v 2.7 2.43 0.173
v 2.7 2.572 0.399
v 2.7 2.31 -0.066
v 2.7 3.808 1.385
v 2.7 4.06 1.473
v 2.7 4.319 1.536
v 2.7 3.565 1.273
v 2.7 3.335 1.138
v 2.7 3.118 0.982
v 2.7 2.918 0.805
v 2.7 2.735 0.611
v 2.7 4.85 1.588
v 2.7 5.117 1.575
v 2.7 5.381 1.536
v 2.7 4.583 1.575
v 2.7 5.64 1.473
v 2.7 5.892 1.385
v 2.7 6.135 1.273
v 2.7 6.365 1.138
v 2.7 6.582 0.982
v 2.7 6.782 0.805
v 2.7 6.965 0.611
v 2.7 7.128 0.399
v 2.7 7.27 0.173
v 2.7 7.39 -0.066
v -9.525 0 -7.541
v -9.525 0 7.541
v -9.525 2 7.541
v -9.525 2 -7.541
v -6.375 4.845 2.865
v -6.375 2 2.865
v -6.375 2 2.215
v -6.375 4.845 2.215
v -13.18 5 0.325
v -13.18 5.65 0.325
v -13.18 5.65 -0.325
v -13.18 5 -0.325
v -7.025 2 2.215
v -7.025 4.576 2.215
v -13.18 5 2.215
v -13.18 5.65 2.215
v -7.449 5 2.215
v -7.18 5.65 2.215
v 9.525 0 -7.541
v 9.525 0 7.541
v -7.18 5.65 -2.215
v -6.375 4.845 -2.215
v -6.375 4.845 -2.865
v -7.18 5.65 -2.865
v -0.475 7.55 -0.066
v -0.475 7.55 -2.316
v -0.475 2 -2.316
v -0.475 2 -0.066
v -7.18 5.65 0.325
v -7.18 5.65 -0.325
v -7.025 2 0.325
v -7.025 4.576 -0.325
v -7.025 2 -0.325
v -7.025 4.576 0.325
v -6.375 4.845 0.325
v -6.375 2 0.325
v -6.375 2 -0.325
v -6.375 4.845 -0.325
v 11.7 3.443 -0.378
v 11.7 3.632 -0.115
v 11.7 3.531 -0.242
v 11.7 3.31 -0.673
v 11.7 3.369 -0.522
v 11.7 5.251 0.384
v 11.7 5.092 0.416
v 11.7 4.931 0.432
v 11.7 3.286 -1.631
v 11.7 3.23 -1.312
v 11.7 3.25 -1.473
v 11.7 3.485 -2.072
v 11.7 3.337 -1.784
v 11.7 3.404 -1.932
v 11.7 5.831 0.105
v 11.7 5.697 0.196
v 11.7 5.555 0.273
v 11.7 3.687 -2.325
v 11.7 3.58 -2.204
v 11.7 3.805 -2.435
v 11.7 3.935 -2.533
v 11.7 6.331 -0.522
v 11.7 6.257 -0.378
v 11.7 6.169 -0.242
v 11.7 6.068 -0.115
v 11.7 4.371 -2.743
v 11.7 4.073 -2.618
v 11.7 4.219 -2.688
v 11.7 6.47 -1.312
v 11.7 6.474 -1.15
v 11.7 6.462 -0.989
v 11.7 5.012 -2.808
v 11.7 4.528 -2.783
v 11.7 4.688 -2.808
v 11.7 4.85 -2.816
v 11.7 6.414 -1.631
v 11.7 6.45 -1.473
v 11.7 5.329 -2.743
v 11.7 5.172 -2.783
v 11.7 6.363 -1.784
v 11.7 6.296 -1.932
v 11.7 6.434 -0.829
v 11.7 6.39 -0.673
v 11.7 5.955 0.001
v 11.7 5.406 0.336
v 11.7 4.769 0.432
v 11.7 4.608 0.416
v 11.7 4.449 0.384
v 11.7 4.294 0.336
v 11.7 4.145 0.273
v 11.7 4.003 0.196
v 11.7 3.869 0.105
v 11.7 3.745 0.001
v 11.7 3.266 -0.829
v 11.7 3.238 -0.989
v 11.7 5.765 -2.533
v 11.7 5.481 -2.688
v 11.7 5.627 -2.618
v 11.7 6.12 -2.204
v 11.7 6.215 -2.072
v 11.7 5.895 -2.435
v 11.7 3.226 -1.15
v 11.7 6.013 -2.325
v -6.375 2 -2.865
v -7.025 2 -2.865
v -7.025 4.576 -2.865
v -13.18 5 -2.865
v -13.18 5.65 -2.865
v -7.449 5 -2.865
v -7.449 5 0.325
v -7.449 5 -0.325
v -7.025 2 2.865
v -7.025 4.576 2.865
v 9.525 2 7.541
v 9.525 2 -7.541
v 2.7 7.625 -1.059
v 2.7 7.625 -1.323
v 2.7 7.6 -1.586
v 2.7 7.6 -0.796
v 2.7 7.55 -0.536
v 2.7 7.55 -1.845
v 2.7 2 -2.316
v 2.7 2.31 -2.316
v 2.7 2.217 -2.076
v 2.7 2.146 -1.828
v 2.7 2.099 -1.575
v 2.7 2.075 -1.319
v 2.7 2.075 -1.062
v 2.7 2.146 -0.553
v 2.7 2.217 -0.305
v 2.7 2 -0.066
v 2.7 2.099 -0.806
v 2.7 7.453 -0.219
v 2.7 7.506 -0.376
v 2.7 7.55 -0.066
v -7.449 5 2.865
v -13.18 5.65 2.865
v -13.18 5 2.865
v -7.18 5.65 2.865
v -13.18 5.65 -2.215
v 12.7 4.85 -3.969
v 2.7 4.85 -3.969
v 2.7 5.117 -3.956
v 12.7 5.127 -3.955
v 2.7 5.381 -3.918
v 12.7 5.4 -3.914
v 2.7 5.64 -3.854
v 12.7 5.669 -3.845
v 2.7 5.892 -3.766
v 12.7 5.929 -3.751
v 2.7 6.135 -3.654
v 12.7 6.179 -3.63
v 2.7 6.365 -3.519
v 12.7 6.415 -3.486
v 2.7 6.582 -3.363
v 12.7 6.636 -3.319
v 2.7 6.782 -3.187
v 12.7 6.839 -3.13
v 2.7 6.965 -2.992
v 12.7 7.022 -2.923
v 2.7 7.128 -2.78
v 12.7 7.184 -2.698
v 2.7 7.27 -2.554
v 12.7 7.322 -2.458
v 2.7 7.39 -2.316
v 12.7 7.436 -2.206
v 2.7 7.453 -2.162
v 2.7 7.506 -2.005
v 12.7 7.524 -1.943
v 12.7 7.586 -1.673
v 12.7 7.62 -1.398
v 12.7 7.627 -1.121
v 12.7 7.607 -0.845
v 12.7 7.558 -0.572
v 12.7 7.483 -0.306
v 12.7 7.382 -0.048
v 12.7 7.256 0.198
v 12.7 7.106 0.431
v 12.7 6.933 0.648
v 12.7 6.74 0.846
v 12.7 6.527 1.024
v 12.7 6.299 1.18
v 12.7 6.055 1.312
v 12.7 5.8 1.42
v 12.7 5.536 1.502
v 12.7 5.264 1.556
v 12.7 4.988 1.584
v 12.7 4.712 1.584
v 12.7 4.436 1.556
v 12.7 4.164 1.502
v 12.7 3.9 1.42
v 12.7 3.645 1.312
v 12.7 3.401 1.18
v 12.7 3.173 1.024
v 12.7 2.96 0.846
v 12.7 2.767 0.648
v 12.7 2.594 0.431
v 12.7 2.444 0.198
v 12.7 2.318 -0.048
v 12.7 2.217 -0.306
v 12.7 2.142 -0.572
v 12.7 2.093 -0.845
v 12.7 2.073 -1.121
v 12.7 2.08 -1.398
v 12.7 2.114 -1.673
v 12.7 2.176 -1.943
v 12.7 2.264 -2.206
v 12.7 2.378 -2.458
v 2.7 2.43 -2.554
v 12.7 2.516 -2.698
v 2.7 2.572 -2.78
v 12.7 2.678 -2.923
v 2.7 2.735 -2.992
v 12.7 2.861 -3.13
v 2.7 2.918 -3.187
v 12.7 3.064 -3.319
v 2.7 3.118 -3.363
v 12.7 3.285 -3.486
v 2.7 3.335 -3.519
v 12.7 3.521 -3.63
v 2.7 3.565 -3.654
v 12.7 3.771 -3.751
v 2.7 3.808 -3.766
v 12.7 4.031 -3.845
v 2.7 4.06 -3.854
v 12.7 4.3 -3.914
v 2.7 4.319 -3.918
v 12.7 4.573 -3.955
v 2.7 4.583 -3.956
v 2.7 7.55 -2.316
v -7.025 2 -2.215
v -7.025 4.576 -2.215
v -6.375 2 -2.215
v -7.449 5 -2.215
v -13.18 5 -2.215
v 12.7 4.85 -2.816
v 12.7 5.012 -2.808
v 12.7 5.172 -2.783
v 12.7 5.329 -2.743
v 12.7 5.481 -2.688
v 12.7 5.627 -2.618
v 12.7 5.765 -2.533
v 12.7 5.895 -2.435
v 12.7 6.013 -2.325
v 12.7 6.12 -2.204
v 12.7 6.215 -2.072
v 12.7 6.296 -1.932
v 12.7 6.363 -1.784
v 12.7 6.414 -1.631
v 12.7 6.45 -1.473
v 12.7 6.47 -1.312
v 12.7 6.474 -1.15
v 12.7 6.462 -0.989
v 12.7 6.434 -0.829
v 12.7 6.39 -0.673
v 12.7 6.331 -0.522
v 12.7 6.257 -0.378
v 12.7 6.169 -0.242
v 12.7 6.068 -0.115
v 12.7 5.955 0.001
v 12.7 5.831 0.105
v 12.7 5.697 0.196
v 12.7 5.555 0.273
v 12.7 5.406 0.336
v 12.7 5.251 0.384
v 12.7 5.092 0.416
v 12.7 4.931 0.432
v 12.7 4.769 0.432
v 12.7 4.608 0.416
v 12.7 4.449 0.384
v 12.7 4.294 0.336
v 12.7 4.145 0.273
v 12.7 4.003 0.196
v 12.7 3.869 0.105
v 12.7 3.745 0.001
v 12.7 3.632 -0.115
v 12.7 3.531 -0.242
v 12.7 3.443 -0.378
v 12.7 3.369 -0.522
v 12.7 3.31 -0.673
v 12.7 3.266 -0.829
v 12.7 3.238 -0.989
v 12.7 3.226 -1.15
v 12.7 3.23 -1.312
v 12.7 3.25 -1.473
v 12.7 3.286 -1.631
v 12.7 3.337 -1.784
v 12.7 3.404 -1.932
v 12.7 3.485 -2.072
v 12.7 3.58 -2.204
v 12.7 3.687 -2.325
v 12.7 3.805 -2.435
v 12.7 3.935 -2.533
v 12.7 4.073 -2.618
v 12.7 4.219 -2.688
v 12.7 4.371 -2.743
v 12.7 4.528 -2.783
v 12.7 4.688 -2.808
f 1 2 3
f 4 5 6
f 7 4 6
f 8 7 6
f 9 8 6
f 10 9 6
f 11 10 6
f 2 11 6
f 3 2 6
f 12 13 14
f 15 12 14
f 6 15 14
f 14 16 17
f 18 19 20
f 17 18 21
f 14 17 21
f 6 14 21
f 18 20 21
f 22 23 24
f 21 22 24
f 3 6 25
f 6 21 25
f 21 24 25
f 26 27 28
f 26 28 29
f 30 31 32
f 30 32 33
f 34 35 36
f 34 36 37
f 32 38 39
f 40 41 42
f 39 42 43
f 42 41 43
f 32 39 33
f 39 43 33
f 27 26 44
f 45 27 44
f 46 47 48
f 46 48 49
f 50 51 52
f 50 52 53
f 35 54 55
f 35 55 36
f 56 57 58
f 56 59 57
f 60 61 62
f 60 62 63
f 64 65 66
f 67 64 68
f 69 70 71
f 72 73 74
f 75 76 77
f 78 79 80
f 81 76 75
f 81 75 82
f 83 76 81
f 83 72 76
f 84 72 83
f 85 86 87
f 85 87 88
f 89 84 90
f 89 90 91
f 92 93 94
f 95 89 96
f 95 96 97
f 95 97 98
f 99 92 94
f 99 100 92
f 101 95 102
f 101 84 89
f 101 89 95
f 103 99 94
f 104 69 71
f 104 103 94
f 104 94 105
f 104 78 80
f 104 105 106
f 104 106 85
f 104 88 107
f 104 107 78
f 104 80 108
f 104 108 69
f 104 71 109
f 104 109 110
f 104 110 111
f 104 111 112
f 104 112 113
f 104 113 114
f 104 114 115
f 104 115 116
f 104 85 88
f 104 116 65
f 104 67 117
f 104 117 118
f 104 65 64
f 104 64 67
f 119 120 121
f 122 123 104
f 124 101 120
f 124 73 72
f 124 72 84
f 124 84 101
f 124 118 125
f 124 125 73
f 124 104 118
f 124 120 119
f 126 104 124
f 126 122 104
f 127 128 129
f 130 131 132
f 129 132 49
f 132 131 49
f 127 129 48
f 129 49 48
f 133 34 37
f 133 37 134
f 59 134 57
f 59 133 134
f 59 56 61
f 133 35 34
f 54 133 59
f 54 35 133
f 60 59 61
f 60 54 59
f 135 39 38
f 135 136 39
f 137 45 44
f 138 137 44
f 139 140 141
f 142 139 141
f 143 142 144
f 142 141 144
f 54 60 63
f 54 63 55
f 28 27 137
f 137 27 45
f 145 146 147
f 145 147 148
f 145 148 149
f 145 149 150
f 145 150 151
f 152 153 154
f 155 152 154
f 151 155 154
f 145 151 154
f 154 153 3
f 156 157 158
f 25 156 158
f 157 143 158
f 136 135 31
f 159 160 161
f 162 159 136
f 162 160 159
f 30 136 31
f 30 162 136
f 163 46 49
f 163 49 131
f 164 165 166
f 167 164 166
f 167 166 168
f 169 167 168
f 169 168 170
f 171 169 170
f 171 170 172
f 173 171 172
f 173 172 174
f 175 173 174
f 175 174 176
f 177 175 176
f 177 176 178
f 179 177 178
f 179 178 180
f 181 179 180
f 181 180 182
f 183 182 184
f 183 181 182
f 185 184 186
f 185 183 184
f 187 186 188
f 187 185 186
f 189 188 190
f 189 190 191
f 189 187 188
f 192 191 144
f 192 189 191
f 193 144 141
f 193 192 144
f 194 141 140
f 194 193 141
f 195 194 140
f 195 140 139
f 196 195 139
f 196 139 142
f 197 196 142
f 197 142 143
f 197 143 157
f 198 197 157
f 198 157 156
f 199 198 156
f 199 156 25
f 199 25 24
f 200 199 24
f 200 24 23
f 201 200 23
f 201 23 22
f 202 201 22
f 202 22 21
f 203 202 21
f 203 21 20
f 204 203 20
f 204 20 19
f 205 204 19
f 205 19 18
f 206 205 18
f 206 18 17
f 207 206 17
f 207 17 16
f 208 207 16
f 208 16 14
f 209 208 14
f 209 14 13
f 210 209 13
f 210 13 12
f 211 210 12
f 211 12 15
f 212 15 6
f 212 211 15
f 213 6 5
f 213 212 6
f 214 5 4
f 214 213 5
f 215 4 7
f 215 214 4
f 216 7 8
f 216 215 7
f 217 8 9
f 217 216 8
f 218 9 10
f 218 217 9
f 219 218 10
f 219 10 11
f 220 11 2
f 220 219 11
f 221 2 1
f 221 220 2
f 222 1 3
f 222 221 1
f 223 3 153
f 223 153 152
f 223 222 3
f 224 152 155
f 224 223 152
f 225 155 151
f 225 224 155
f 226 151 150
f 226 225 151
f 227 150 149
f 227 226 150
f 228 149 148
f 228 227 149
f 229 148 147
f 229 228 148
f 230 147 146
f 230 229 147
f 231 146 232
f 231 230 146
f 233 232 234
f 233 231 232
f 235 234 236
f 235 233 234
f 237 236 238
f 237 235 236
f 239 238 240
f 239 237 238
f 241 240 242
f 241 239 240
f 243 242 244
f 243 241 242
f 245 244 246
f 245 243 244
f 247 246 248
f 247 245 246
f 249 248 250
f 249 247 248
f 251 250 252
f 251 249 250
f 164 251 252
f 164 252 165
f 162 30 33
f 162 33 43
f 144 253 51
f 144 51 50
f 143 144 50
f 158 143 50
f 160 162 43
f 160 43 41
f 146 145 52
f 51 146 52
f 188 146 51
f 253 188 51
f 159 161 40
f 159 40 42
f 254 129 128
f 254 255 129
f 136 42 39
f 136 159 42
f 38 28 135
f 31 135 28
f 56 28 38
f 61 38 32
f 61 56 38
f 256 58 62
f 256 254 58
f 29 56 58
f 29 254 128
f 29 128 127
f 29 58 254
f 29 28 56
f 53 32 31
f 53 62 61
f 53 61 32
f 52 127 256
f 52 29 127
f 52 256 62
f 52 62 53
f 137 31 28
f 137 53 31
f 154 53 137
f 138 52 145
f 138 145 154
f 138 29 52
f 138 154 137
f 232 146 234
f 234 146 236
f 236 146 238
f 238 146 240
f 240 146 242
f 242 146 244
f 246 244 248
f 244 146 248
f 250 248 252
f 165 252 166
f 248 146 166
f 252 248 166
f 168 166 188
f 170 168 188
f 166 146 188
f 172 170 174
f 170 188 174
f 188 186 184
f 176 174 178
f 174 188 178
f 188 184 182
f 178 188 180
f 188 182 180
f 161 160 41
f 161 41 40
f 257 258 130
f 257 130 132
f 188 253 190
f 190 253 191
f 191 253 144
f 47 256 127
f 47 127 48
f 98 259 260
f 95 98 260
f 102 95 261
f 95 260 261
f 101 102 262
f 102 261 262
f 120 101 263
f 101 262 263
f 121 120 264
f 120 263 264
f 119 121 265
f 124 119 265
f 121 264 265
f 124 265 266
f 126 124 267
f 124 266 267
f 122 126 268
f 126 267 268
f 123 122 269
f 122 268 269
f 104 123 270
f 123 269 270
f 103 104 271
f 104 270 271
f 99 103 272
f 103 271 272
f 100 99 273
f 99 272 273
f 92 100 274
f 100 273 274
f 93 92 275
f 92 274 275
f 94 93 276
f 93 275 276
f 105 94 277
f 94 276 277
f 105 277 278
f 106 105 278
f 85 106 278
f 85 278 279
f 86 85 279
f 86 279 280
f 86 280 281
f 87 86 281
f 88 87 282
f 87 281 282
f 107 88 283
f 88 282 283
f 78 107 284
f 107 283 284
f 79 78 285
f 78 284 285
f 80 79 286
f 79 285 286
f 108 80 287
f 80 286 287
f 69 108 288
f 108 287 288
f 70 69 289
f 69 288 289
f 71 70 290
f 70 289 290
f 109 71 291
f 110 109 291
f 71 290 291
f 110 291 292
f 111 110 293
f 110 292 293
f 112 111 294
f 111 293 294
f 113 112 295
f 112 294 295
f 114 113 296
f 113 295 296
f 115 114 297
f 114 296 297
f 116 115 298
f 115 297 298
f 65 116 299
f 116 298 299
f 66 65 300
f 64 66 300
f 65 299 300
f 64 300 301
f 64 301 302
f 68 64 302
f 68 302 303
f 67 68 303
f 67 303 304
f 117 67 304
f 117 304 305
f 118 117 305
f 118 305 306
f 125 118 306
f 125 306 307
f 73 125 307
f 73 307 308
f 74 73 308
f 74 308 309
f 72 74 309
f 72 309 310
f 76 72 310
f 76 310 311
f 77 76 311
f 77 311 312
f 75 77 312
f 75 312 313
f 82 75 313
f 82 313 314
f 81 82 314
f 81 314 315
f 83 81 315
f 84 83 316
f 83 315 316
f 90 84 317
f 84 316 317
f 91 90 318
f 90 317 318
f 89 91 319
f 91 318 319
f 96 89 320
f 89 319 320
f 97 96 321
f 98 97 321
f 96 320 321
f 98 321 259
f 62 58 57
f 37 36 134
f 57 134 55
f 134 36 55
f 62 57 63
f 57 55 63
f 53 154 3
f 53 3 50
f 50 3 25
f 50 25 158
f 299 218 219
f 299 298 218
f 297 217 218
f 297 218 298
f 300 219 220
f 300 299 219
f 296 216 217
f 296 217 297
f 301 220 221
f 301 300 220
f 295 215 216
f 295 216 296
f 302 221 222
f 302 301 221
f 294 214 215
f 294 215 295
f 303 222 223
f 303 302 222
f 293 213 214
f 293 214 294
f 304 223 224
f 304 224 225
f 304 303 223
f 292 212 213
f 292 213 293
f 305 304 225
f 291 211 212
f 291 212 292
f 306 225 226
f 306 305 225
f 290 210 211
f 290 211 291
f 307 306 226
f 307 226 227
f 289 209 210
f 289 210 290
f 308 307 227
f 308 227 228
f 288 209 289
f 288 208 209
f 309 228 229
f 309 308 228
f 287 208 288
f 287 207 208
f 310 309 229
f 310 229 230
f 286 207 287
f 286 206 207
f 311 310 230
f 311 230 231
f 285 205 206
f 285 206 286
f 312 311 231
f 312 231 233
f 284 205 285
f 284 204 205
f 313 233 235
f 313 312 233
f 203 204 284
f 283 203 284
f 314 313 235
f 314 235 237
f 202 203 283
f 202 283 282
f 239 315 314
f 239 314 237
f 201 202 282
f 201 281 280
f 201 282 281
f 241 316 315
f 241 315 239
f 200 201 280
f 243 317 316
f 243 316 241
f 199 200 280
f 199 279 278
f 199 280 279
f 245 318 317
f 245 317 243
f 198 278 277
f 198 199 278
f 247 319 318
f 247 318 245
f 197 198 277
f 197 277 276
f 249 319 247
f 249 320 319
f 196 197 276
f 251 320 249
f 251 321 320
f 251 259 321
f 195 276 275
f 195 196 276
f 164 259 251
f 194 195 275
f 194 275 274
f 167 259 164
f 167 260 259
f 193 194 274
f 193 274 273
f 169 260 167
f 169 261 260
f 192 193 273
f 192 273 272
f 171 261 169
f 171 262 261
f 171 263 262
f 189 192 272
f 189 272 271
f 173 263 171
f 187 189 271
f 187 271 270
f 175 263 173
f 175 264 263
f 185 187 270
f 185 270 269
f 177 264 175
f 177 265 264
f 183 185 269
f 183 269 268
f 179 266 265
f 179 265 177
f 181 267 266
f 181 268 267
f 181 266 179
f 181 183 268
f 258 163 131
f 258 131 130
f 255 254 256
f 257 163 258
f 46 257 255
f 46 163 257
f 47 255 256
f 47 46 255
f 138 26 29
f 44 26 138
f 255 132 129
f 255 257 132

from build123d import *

# Parameters (mm, degrees)
SKETCH1_W               = 19.05
SKETCH1_H               = 15.08125
BOARD_DEPTH             = 2
SKETCH2_R               = 2.778125
LASERBARREL_DEPTH       = 10
SKETCH4_W               = 2.25
SKETCH4_H               = 5.55
BARREL_BUTT_MOUNT_DEPTH = 3.175
BOSS_EXTRUDE1_DEPTH     = 0.325
LPATTERN1_COUNT         = 2
LPATTERN1_PITCH         = 2.54
LPATTERN1_COUNT_DIR2    = 2
LPATTERN1_PITCH_DIR2    = 2.54
SKETCH6_R               = 1.625
CUT_EXTRUDE1_DEPTH      = 1


with BuildPart() as part:
    # Sketch1 → Board (new body)
    with BuildSketch(Plane(origin=(0, 0, 0), x_dir=(1, 0, 0), z_dir=(0, 1, 0))):
        Rectangle(SKETCH1_W, SKETCH1_H)
    extrude(amount=BOARD_DEPTH)



with BuildPart() as body_2:
    # Sketch2 → LaserBarrel (new body)
    with BuildSketch(Plane(origin=(12.7, 0, 0), x_dir=(0, 0, -1), z_dir=(1, 0, 0))):
        with Locations((1.190625, 4.85)):
            Circle(SKETCH2_R)
    extrude(amount=-LASERBARREL_DEPTH)


with BuildPart() as part_1:
    add(part.part)

    add(body_2.part)  # Barrel Butt Mount merges body 2
    # Sketch4 → Barrel Butt Mount (add)
    with BuildSketch(Plane.ZY.offset(-2.7)):
        with Locations((-1.190625, 4.775)):
            Rectangle(SKETCH4_W, SKETCH4_H)
    extrude(amount=BARREL_BUTT_MOUNT_DEPTH)

    # Sketch5 → Boss-Extrude1 (add, symmetric)
    with BuildSketch(Plane.XY):
        Polygon((-7.025, 2), (-6.375, 2), (-6.375, 4.844974747), (-7.180025253, 5.65), (-13.180025253, 5.65), (-13.180025253, 5), (-7.449264069, 5), (-7.025, 4.575735931), align=None)
    boss_extrude1 = extrude(amount=BOSS_EXTRUDE1_DEPTH, both=True)

    # LPattern1: Boss-Extrude1 2 × 2
    with Locations(*[Vector(0, 0, -1) * (i * LPATTERN1_PITCH) + Vector(0, 0, 1) * (j * LPATTERN1_PITCH_DIR2) for i in range(LPATTERN1_COUNT) for j in range(LPATTERN1_COUNT_DIR2) if (i, j) != (0, 0)]):
        add(boss_extrude1)

    # Sketch6 → Cut-Extrude1 (cut)
    with BuildSketch(Plane(origin=(12.7, 0, 0), x_dir=(0, 0, -1), z_dir=(1, 0, 0))):
        with Locations((1.190625, 4.85)):
            Circle(SKETCH6_R)
    extrude(amount=-CUT_EXTRUDE1_DEPTH, mode=Mode.SUBTRACT)


solid = part_1.part
